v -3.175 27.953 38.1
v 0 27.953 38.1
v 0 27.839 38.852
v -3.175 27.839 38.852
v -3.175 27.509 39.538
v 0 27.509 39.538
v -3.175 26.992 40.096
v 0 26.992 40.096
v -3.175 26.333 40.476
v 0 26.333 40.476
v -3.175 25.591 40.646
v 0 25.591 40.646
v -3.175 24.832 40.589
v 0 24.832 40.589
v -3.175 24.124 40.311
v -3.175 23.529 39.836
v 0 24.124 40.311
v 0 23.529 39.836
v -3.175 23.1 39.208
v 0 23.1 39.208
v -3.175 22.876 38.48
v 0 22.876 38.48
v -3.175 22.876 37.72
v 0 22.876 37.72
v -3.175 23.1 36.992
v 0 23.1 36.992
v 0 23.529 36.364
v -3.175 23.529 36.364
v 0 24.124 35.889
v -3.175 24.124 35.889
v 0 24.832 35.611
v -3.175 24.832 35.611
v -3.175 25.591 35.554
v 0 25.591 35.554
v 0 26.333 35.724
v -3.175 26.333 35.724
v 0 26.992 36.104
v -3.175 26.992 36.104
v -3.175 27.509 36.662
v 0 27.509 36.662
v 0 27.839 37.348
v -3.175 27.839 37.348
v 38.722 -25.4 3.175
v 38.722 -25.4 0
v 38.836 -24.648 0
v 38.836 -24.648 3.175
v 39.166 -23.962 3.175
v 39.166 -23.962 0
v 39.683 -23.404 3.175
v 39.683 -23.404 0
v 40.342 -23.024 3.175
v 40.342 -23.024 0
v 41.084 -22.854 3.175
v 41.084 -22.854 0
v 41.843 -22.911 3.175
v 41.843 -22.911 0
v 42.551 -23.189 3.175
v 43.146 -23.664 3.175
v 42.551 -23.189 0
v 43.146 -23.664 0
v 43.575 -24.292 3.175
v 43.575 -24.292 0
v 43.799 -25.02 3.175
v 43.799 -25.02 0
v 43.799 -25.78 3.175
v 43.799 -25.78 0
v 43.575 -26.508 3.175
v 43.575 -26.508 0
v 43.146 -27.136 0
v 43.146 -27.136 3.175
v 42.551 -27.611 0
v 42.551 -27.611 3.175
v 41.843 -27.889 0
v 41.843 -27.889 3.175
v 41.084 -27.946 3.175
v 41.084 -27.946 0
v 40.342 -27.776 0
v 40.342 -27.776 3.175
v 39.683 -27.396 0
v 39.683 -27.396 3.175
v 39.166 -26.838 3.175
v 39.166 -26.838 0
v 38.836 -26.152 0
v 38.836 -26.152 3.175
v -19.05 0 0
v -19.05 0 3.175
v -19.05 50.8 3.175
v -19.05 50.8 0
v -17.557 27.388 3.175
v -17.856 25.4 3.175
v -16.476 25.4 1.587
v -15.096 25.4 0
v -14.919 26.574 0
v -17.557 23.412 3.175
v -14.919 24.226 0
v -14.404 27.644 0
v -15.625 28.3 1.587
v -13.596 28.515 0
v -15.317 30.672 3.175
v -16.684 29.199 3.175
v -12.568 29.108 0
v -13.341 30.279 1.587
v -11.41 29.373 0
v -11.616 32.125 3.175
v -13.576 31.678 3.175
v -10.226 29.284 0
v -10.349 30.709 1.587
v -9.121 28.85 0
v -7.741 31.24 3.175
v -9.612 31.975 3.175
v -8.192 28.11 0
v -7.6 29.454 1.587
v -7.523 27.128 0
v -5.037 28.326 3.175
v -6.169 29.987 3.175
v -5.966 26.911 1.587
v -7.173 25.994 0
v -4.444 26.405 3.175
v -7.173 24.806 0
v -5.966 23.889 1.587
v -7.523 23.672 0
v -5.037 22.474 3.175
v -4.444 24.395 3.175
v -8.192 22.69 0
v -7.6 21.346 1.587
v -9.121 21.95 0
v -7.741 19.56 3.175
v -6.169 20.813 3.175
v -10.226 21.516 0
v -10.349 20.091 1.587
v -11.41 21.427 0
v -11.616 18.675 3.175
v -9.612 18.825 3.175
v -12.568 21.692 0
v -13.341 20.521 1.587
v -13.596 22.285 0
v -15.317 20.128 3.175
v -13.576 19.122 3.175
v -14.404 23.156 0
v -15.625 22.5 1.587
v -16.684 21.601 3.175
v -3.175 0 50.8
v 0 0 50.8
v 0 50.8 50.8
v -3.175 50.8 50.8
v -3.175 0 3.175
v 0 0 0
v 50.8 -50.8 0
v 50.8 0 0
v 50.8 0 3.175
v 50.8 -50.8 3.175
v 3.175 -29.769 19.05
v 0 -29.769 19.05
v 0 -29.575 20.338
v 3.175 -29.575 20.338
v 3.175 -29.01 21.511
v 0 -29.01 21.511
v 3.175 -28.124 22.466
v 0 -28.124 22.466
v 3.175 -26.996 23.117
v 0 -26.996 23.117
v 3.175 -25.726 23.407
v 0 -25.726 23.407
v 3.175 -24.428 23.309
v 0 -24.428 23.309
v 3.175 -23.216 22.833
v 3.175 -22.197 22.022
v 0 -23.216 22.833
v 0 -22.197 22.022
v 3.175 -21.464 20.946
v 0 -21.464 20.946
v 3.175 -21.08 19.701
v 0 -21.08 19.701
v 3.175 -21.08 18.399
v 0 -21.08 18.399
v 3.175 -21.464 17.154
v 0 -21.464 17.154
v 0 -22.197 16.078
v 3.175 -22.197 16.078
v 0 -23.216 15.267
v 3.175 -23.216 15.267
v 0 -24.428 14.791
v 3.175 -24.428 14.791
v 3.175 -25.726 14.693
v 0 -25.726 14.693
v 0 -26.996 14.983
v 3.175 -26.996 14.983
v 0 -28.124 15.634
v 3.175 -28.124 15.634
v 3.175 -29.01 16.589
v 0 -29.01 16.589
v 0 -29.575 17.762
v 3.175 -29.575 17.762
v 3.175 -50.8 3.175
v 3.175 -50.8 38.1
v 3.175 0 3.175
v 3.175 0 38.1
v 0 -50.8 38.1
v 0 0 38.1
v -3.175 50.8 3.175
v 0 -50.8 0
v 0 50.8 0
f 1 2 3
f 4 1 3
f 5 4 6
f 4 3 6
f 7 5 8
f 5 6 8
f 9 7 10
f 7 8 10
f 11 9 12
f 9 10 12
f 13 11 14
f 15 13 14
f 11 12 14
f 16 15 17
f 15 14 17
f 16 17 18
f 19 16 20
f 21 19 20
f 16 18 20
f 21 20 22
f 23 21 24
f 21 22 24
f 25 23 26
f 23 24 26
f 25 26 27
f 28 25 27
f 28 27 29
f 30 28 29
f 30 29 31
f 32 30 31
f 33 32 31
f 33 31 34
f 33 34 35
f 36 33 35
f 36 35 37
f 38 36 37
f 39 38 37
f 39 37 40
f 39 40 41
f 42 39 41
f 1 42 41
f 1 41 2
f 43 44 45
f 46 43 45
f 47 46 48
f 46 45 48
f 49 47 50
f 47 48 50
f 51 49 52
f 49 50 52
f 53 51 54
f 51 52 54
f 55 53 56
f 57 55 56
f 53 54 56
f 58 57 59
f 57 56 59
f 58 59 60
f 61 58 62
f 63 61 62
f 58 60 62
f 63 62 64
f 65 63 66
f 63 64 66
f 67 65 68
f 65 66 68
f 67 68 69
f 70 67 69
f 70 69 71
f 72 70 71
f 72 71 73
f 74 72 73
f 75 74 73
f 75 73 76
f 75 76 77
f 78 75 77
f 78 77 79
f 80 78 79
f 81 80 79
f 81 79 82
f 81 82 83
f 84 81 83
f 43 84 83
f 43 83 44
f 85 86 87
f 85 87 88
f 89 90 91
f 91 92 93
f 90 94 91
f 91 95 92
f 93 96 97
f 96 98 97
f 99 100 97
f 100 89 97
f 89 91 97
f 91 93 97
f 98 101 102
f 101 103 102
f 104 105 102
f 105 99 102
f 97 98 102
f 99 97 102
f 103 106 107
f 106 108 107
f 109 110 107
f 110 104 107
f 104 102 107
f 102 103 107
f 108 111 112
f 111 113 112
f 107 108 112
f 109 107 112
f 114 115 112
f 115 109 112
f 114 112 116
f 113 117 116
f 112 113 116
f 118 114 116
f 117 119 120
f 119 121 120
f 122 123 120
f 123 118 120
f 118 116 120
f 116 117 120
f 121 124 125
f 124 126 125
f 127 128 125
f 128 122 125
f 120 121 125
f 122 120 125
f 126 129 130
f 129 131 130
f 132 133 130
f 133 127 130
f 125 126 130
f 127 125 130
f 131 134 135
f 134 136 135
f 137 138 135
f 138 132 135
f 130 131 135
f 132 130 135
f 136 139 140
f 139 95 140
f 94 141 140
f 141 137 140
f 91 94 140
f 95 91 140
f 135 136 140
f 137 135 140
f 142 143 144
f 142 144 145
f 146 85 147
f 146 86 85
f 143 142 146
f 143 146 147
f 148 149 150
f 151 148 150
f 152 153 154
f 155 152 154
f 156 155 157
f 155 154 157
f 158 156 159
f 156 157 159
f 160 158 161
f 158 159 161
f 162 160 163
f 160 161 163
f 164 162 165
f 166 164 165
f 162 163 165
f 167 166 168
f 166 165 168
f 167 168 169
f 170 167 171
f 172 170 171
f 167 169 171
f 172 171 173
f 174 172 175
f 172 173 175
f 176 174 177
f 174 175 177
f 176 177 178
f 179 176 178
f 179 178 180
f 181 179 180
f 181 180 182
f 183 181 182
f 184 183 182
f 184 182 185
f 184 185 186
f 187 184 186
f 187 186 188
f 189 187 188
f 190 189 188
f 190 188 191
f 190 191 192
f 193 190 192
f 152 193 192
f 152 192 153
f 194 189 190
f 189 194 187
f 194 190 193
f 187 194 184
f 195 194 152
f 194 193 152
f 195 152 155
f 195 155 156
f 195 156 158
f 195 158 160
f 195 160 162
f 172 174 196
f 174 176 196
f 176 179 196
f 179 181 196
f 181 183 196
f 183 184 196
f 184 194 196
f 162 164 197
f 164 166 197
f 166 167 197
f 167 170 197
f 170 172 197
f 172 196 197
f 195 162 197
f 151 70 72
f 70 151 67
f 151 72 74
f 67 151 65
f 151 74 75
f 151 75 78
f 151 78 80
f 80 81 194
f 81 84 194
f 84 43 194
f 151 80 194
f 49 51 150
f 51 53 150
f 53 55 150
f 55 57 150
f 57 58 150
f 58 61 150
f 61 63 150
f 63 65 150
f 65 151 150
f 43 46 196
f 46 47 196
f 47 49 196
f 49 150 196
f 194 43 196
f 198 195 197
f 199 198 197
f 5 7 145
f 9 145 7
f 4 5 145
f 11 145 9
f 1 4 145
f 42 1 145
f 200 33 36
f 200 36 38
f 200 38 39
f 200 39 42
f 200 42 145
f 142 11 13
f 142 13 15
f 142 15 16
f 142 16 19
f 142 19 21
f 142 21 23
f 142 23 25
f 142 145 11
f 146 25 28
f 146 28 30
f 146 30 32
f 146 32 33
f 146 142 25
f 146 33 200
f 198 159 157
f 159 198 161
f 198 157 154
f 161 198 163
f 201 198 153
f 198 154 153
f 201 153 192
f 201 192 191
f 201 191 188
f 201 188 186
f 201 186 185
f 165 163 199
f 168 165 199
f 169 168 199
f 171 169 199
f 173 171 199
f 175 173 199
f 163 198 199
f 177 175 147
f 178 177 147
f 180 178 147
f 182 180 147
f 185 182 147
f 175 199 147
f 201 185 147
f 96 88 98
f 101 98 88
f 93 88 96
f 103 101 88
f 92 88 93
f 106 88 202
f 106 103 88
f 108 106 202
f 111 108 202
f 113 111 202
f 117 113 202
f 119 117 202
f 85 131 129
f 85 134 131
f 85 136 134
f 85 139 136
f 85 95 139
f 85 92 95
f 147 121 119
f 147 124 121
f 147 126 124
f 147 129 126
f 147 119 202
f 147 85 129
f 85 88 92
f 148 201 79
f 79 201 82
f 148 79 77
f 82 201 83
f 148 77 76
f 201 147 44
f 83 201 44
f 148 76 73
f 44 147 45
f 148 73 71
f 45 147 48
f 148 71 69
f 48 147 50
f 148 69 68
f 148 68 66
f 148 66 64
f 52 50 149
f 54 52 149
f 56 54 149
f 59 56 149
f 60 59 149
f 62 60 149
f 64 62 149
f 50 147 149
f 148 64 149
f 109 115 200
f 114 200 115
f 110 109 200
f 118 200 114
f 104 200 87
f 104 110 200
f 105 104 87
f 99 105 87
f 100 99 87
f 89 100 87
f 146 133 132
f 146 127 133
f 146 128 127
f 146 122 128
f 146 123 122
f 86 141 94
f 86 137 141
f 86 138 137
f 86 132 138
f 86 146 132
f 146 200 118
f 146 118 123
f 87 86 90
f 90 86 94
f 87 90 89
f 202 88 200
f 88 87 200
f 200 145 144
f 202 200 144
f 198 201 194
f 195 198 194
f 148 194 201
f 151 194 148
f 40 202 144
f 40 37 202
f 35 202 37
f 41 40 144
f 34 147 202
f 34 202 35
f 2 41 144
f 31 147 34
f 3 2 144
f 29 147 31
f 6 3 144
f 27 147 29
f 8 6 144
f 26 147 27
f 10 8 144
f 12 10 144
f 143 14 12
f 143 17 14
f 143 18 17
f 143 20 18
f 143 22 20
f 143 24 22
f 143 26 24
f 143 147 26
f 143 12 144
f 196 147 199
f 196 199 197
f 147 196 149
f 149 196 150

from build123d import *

# Parameters (mm, degrees)
F1_DEPTH        = 50.8
F3_D            = 5.1054
F5_D            = 8.7376
F6_W            = 68.8491852673
F6_H            = 40.5795811865
F7_DEPTH        = 25.4
F9_DEPTH        = 50.8
F11_D           = 7.1374
F11_CSINK_D     = 13.4874
F11_CSINK_ANGLE = 82
F13_D           = 5.1054


with BuildPart() as f1:
    # F0 (on Front) → F1 (new body)
    with BuildSketch(Plane.XZ):
        Polygon((0, 50.8), (0, 0), (50.8, 0), (50.8, 3.175), (3.175, 3.175), (3.175, 50.8), align=None)
    extrude(amount=F1_DEPTH)

    # F3 (through all)
    with Locations(Plane.XY.offset(3.175)):
        with Locations((41.275, -25.4)):
            Hole(F3_D / 2)

    # F5 (through all)
    with Locations(Plane.YZ.offset(3.175)):
        with Locations((-25.4, 19.05)):
            Hole(F5_D / 2)

    # F6 (on face) → F7 (cut)
    with BuildSketch(Plane.YZ.offset(3.175)):
        with Locations((-34.4245926337, 58.3897905932)):
            Rectangle(F6_W, F6_H)
    extrude(amount=-F7_DEPTH, mode=Mode.SUBTRACT)


with BuildPart() as f9:
    # F8 (on Front) → F9 (new body)
    with BuildSketch(Plane.XZ):
        Polygon((-19.05, 0), (0, 0), (0, 50.8), (-3.175, 50.8), (-3.175, 3.175), (-19.05, 3.175), align=None)
    extrude(amount=-F9_DEPTH)

    # F11 (through all)
    with Locations(Plane.XY.offset(3.175)):
        with Locations((-11.1125, 25.4)):
            CounterSinkHole(F11_D / 2, F11_CSINK_D / 2, counter_sink_angle=F11_CSINK_ANGLE)

    # F13 (through all)
    with Locations(Plane(origin=(-3.175, 0, 0), x_dir=(0, -1, 0), z_dir=(-1, 0, 0))):
        with Locations((-25.4, 38.1)):
            Hole(F13_D / 2)


solid = Compound([f1.part, f9.part])
